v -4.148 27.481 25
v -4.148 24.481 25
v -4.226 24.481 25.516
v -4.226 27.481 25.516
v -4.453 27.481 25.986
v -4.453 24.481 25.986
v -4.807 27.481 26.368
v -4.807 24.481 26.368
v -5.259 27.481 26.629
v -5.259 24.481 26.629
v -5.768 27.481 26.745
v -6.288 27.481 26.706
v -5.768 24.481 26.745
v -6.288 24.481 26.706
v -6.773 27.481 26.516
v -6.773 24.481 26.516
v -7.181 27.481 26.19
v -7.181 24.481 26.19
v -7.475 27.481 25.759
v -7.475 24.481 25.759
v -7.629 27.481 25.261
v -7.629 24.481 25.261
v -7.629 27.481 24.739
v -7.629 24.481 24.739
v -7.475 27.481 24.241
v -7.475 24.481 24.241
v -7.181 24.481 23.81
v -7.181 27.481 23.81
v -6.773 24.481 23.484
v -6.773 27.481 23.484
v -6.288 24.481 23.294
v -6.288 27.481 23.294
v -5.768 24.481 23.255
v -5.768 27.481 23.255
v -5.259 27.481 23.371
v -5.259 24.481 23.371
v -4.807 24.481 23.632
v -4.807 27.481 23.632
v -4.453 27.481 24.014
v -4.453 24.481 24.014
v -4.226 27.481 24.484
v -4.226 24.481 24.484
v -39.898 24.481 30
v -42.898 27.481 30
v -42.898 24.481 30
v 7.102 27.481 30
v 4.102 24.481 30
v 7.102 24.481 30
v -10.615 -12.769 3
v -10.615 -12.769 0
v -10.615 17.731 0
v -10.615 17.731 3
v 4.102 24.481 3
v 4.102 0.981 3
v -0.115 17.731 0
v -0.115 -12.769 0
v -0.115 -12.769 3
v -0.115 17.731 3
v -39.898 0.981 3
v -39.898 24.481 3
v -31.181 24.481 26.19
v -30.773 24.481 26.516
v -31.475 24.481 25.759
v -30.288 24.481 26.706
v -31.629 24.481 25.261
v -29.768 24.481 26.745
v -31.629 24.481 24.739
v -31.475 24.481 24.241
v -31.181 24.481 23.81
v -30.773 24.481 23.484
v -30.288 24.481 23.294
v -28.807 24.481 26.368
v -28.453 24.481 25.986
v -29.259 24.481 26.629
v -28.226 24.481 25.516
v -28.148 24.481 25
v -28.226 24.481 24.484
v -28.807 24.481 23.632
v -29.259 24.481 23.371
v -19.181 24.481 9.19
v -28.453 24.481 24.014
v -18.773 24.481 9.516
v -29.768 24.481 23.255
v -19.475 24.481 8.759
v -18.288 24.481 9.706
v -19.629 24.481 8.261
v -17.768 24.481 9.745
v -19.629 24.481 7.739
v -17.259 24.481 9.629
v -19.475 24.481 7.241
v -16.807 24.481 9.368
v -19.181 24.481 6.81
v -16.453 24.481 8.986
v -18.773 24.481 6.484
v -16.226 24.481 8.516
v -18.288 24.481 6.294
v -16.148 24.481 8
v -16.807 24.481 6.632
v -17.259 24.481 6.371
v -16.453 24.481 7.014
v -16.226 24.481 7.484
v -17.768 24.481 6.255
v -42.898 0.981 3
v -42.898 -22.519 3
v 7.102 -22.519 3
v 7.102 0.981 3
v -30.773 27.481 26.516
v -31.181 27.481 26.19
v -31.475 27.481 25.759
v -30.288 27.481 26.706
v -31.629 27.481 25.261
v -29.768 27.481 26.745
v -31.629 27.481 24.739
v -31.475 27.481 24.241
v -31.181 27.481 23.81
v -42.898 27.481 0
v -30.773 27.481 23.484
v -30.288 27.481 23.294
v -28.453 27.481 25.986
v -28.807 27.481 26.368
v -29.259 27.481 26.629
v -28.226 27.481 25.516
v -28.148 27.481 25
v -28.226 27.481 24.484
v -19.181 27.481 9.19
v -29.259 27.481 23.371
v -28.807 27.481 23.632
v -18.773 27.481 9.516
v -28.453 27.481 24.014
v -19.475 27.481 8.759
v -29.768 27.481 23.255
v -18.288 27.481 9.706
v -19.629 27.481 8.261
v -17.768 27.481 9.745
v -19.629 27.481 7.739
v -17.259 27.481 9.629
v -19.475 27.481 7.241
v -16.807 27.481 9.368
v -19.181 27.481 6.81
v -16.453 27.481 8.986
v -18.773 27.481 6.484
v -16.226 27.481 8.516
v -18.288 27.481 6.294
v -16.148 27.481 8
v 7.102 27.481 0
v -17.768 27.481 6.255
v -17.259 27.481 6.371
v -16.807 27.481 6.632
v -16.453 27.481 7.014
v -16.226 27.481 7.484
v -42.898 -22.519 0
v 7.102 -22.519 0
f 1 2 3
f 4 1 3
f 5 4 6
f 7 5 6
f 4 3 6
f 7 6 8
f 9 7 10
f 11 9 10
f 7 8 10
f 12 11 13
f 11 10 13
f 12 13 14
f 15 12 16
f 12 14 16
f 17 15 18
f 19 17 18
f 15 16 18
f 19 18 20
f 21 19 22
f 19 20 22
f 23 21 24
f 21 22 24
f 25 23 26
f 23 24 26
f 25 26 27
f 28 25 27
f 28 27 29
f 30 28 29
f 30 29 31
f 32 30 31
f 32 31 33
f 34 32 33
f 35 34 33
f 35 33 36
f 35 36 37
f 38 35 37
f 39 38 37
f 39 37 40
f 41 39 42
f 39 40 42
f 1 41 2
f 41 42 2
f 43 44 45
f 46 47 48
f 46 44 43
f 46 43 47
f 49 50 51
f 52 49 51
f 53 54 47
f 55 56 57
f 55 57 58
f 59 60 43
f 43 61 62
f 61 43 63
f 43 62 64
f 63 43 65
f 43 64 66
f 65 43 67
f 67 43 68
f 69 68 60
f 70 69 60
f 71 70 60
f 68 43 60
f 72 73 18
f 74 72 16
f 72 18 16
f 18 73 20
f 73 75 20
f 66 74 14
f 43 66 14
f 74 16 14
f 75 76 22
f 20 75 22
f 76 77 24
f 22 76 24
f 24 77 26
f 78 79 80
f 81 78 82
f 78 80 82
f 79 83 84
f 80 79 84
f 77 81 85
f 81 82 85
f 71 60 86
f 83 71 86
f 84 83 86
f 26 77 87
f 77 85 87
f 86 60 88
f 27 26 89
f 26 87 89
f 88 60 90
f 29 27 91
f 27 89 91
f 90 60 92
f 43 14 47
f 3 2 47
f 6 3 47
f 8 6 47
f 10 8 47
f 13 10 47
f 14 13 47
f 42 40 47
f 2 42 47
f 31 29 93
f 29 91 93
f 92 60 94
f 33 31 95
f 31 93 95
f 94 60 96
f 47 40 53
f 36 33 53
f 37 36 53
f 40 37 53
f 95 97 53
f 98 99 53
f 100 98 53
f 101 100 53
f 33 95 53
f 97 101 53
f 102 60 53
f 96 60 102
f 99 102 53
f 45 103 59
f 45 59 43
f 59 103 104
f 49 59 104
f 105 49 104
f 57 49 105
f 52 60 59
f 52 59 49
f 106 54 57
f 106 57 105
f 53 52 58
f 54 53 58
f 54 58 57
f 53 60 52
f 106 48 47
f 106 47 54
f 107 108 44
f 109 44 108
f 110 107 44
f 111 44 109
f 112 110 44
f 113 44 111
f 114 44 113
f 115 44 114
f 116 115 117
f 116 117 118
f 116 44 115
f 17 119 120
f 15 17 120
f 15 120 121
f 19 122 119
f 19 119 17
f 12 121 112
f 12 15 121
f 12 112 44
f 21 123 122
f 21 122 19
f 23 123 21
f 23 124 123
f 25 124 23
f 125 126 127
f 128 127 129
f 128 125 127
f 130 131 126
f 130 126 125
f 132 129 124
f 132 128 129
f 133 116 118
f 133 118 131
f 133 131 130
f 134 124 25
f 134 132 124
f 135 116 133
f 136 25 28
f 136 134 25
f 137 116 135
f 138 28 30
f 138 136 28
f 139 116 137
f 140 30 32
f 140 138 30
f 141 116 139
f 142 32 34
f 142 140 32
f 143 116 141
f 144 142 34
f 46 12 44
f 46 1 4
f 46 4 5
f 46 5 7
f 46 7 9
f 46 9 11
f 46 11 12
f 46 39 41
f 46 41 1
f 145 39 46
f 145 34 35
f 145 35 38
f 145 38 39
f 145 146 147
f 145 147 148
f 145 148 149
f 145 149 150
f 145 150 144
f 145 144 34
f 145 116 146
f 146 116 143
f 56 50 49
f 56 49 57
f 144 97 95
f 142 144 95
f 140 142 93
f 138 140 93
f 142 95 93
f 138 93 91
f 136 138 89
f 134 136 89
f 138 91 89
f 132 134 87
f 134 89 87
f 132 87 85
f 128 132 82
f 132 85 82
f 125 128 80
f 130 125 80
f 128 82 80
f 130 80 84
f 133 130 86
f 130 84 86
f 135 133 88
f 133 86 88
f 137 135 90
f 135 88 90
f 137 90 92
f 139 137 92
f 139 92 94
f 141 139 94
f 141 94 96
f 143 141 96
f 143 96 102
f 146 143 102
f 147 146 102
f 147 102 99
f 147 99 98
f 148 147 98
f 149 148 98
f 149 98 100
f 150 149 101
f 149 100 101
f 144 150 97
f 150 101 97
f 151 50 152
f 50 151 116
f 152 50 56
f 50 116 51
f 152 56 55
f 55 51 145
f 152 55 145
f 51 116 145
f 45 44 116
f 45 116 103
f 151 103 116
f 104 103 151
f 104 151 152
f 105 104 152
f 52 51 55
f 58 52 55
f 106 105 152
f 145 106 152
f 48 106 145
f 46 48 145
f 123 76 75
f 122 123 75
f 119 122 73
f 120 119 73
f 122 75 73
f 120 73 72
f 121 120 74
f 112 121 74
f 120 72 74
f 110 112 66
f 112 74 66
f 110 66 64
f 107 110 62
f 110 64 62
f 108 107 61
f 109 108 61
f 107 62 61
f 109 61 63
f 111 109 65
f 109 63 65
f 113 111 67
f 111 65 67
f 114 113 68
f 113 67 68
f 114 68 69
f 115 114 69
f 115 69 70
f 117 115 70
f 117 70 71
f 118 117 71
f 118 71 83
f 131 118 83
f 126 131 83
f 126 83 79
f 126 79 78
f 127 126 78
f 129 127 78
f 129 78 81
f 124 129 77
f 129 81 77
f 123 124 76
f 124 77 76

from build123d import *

# Parameters (mm, degrees)
F0_W     = 50
F0_H     = 3
F1_DEPTH = 30
F0_H_2   = 47
F0_W_2   = 10.5
F0_H_3   = 30.5
F2_DEPTH = 3
F4_DEPTH = 3
F6_DEPTH = 3
F7_R     = 1.75
F8_DEPTH = 3


with BuildPart() as f1:
    # F0 (on Top) → F1 (new body)
    with BuildSketch(Plane.XY):
        with Locations((-17.8984425962, 25.9814620614)):
            Rectangle(F0_W, F0_H)
    extrude(amount=F1_DEPTH)

    # F0 (on Top) → F2 (join)
    with BuildSketch(Plane.XY):
        with Locations((-17.8984425962, 0.9814620614)):
            Rectangle(F0_W, F0_H_2)
        with Locations((-30.4321678579, 2.4814620614)):
            Rectangle(F0_W_2, F0_H_3, mode=Mode.SUBTRACT)
        with Locations((-5.3647173345, 2.4814620614)):
            Rectangle(F0_W_2, F0_H_3, mode=Mode.SUBTRACT)
        with Locations((-30.4321678579, 2.4814620614)):
            Rectangle(F0_W_2, F0_H_3)
    extrude(amount=F2_DEPTH)

    # F3 (on face) → F4 (join)
    with BuildSketch(Plane(origin=(-42.8984425962, 0, 0), x_dir=(0, -1, 0), z_dir=(-1, 0, 0))):
        Polygon((-0.9814620614, 3), (-24.4814620614, 30), (-24.4814620614, 3), align=None)
    extrude(amount=-F4_DEPTH)

    # F5 (on face) → F6 (join)
    with BuildSketch(Plane.YZ.offset(7.1015574038)):
        Polygon((24.4814620614, 3), (24.4814620614, 30), (0.9814620614, 3), align=None)
    extrude(amount=-F6_DEPTH)

    # F7 (on face) → F8 (cut)
    with BuildSketch(Plane.XZ.offset(-24.4814620614)):
        with Locations((-29.8984425962, 25)):
            Circle(F7_R)
        with Locations((-5.8984425962, 25)):
            Circle(F7_R)
        with Locations((-17.8984425962, 8)):
            Circle(F7_R)
    extrude(amount=-F8_DEPTH, mode=Mode.SUBTRACT)


solid = f1.part
